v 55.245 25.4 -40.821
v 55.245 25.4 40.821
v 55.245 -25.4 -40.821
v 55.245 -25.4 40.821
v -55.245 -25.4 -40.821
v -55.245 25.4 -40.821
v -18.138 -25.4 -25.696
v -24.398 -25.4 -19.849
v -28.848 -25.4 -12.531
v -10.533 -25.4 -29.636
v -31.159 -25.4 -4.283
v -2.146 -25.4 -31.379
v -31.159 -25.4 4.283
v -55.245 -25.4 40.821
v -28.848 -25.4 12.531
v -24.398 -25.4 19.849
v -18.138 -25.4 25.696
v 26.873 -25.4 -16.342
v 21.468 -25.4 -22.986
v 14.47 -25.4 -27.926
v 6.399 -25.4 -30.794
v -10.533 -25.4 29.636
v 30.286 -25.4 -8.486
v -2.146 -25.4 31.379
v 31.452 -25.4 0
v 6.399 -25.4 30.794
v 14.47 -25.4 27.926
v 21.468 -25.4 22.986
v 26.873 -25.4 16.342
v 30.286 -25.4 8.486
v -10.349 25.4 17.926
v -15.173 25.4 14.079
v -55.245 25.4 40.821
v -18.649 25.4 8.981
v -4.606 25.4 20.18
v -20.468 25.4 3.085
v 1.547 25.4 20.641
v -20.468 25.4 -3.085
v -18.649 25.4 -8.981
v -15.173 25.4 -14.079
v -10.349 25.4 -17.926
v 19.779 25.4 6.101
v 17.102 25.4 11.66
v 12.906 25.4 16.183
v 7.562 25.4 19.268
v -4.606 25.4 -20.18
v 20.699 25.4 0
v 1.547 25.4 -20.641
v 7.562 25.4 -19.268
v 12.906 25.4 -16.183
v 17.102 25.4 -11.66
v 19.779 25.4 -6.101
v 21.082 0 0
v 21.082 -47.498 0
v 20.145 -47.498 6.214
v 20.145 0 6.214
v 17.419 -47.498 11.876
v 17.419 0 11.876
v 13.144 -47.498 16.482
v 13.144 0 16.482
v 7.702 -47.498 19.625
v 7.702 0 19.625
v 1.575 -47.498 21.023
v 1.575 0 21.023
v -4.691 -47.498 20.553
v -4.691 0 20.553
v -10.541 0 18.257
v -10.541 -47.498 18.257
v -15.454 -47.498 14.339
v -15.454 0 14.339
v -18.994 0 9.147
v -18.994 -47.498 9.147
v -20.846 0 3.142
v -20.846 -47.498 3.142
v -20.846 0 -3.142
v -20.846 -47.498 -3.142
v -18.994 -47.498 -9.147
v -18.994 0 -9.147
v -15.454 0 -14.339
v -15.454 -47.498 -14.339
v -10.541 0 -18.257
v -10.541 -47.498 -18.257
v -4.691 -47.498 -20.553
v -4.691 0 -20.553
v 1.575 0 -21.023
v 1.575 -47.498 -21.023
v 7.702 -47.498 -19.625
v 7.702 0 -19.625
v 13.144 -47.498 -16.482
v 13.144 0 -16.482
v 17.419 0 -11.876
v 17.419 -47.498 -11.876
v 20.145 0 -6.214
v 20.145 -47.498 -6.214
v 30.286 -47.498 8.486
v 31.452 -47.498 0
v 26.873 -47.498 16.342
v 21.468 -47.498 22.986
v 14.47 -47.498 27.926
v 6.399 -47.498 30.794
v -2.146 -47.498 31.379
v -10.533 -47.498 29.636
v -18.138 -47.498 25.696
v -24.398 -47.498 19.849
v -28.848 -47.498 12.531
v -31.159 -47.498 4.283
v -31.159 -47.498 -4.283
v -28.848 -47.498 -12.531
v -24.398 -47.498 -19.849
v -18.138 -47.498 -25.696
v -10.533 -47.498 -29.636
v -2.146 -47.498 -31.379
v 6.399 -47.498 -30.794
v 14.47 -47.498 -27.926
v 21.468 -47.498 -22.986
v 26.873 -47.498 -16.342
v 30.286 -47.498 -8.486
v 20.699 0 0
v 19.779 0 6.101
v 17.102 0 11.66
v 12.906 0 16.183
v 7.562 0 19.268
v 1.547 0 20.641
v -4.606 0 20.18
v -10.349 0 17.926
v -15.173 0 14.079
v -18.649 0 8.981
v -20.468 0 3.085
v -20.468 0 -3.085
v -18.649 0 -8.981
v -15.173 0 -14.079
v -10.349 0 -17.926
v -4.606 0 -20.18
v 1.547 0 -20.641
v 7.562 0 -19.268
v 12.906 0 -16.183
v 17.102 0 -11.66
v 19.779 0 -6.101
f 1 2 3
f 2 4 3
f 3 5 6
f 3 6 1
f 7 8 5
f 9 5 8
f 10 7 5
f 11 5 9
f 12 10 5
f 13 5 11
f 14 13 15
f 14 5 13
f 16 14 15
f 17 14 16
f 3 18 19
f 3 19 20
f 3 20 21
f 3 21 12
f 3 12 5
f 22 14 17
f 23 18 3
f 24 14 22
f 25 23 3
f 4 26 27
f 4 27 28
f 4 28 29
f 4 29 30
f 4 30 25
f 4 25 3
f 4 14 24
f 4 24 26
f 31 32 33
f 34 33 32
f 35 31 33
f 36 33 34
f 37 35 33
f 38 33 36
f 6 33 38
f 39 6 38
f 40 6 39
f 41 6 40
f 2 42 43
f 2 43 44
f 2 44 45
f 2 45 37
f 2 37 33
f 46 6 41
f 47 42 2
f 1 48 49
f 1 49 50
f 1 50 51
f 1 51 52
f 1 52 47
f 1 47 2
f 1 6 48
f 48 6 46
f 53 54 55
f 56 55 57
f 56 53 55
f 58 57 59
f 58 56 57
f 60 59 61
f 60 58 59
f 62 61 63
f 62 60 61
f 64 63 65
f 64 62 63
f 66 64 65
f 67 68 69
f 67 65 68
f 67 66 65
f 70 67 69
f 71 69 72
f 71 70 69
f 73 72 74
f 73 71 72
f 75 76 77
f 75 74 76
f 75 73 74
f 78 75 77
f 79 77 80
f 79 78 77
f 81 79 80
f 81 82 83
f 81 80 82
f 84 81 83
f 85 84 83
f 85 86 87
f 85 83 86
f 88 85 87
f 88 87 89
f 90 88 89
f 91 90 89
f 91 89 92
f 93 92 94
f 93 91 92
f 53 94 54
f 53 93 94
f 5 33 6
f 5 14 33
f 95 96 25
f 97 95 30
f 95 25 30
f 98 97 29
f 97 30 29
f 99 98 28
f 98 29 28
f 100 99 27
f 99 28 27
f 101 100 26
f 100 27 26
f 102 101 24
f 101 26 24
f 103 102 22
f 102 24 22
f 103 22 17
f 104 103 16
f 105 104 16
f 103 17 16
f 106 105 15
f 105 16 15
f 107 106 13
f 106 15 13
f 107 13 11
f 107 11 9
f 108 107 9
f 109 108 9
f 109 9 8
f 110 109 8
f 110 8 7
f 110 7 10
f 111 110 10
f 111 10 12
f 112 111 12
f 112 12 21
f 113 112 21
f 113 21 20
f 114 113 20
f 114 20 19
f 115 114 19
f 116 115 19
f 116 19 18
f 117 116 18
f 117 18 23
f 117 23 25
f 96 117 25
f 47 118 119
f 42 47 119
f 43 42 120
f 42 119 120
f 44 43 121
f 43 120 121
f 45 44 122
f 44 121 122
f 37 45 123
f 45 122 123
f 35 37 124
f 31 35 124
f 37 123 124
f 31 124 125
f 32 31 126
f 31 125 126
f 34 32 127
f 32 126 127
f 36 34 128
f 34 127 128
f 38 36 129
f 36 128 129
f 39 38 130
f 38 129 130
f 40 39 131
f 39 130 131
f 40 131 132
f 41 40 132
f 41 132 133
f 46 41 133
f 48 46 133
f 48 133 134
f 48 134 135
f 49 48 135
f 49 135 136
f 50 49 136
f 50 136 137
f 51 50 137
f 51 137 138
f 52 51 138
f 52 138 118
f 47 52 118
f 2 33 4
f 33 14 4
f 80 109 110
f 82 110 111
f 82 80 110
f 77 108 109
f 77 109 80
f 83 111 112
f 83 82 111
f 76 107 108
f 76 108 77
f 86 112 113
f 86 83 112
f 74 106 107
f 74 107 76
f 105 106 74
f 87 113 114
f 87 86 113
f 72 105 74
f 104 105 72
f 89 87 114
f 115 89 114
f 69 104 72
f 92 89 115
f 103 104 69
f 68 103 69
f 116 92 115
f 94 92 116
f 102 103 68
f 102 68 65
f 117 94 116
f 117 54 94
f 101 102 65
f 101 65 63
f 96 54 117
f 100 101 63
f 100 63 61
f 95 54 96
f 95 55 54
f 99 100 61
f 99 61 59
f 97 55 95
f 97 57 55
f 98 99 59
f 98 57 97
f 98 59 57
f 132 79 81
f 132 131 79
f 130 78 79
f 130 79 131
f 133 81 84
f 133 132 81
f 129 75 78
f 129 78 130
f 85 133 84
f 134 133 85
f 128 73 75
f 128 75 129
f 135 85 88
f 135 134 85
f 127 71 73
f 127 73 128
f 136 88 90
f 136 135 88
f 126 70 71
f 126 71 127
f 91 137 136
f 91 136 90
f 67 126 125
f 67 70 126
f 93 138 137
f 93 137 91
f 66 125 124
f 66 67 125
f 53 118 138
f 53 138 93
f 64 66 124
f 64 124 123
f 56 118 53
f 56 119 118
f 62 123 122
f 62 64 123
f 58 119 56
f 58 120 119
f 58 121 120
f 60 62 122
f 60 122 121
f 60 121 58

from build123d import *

# Parameters (mm, degrees)
F0_W      = 110.49001
F0_H      = 81.642858
F1_DEPTH  = 25.4
F1_FACE_W = 110.49001
F1_FACE_H = 81.642858
F2_DEPTH  = 25.4
F4_R      = 31.45223
F5_DEPTH  = 47.498
F3_R      = 21.081854
F6_DEPTH  = 117.856
F7_R      = 20.698965
F8_DEPTH  = 81.534


with BuildPart() as f1:
    # F0 (on Front) → F1 (new body)
    with BuildSketch(Plane.XZ):
        Rectangle(F0_W, F0_H)
    extrude(amount=F1_DEPTH)

    # F1_face (on face) → F2 (join)
    with BuildSketch(Plane(origin=(0, 0, 0), x_dir=(1, 0, 0), z_dir=(0, 1, 0))):
        Rectangle(F1_FACE_W, F1_FACE_H)
    extrude(amount=F2_DEPTH)

    # F4 (on Front) → F5 (join)
    with BuildSketch(Plane.XZ):
        Circle(F4_R)
    extrude(amount=F5_DEPTH)

    # F3 (on Front) → F6 (cut)
    with BuildSketch(Plane.XZ):
        Circle(F3_R)
    extrude(amount=F6_DEPTH, mode=Mode.SUBTRACT)

    # F7 (on Front) → F8 (cut)
    with BuildSketch(Plane.XZ):
        Circle(F7_R)
    extrude(amount=-F8_DEPTH, mode=Mode.SUBTRACT)


solid = f1.part
